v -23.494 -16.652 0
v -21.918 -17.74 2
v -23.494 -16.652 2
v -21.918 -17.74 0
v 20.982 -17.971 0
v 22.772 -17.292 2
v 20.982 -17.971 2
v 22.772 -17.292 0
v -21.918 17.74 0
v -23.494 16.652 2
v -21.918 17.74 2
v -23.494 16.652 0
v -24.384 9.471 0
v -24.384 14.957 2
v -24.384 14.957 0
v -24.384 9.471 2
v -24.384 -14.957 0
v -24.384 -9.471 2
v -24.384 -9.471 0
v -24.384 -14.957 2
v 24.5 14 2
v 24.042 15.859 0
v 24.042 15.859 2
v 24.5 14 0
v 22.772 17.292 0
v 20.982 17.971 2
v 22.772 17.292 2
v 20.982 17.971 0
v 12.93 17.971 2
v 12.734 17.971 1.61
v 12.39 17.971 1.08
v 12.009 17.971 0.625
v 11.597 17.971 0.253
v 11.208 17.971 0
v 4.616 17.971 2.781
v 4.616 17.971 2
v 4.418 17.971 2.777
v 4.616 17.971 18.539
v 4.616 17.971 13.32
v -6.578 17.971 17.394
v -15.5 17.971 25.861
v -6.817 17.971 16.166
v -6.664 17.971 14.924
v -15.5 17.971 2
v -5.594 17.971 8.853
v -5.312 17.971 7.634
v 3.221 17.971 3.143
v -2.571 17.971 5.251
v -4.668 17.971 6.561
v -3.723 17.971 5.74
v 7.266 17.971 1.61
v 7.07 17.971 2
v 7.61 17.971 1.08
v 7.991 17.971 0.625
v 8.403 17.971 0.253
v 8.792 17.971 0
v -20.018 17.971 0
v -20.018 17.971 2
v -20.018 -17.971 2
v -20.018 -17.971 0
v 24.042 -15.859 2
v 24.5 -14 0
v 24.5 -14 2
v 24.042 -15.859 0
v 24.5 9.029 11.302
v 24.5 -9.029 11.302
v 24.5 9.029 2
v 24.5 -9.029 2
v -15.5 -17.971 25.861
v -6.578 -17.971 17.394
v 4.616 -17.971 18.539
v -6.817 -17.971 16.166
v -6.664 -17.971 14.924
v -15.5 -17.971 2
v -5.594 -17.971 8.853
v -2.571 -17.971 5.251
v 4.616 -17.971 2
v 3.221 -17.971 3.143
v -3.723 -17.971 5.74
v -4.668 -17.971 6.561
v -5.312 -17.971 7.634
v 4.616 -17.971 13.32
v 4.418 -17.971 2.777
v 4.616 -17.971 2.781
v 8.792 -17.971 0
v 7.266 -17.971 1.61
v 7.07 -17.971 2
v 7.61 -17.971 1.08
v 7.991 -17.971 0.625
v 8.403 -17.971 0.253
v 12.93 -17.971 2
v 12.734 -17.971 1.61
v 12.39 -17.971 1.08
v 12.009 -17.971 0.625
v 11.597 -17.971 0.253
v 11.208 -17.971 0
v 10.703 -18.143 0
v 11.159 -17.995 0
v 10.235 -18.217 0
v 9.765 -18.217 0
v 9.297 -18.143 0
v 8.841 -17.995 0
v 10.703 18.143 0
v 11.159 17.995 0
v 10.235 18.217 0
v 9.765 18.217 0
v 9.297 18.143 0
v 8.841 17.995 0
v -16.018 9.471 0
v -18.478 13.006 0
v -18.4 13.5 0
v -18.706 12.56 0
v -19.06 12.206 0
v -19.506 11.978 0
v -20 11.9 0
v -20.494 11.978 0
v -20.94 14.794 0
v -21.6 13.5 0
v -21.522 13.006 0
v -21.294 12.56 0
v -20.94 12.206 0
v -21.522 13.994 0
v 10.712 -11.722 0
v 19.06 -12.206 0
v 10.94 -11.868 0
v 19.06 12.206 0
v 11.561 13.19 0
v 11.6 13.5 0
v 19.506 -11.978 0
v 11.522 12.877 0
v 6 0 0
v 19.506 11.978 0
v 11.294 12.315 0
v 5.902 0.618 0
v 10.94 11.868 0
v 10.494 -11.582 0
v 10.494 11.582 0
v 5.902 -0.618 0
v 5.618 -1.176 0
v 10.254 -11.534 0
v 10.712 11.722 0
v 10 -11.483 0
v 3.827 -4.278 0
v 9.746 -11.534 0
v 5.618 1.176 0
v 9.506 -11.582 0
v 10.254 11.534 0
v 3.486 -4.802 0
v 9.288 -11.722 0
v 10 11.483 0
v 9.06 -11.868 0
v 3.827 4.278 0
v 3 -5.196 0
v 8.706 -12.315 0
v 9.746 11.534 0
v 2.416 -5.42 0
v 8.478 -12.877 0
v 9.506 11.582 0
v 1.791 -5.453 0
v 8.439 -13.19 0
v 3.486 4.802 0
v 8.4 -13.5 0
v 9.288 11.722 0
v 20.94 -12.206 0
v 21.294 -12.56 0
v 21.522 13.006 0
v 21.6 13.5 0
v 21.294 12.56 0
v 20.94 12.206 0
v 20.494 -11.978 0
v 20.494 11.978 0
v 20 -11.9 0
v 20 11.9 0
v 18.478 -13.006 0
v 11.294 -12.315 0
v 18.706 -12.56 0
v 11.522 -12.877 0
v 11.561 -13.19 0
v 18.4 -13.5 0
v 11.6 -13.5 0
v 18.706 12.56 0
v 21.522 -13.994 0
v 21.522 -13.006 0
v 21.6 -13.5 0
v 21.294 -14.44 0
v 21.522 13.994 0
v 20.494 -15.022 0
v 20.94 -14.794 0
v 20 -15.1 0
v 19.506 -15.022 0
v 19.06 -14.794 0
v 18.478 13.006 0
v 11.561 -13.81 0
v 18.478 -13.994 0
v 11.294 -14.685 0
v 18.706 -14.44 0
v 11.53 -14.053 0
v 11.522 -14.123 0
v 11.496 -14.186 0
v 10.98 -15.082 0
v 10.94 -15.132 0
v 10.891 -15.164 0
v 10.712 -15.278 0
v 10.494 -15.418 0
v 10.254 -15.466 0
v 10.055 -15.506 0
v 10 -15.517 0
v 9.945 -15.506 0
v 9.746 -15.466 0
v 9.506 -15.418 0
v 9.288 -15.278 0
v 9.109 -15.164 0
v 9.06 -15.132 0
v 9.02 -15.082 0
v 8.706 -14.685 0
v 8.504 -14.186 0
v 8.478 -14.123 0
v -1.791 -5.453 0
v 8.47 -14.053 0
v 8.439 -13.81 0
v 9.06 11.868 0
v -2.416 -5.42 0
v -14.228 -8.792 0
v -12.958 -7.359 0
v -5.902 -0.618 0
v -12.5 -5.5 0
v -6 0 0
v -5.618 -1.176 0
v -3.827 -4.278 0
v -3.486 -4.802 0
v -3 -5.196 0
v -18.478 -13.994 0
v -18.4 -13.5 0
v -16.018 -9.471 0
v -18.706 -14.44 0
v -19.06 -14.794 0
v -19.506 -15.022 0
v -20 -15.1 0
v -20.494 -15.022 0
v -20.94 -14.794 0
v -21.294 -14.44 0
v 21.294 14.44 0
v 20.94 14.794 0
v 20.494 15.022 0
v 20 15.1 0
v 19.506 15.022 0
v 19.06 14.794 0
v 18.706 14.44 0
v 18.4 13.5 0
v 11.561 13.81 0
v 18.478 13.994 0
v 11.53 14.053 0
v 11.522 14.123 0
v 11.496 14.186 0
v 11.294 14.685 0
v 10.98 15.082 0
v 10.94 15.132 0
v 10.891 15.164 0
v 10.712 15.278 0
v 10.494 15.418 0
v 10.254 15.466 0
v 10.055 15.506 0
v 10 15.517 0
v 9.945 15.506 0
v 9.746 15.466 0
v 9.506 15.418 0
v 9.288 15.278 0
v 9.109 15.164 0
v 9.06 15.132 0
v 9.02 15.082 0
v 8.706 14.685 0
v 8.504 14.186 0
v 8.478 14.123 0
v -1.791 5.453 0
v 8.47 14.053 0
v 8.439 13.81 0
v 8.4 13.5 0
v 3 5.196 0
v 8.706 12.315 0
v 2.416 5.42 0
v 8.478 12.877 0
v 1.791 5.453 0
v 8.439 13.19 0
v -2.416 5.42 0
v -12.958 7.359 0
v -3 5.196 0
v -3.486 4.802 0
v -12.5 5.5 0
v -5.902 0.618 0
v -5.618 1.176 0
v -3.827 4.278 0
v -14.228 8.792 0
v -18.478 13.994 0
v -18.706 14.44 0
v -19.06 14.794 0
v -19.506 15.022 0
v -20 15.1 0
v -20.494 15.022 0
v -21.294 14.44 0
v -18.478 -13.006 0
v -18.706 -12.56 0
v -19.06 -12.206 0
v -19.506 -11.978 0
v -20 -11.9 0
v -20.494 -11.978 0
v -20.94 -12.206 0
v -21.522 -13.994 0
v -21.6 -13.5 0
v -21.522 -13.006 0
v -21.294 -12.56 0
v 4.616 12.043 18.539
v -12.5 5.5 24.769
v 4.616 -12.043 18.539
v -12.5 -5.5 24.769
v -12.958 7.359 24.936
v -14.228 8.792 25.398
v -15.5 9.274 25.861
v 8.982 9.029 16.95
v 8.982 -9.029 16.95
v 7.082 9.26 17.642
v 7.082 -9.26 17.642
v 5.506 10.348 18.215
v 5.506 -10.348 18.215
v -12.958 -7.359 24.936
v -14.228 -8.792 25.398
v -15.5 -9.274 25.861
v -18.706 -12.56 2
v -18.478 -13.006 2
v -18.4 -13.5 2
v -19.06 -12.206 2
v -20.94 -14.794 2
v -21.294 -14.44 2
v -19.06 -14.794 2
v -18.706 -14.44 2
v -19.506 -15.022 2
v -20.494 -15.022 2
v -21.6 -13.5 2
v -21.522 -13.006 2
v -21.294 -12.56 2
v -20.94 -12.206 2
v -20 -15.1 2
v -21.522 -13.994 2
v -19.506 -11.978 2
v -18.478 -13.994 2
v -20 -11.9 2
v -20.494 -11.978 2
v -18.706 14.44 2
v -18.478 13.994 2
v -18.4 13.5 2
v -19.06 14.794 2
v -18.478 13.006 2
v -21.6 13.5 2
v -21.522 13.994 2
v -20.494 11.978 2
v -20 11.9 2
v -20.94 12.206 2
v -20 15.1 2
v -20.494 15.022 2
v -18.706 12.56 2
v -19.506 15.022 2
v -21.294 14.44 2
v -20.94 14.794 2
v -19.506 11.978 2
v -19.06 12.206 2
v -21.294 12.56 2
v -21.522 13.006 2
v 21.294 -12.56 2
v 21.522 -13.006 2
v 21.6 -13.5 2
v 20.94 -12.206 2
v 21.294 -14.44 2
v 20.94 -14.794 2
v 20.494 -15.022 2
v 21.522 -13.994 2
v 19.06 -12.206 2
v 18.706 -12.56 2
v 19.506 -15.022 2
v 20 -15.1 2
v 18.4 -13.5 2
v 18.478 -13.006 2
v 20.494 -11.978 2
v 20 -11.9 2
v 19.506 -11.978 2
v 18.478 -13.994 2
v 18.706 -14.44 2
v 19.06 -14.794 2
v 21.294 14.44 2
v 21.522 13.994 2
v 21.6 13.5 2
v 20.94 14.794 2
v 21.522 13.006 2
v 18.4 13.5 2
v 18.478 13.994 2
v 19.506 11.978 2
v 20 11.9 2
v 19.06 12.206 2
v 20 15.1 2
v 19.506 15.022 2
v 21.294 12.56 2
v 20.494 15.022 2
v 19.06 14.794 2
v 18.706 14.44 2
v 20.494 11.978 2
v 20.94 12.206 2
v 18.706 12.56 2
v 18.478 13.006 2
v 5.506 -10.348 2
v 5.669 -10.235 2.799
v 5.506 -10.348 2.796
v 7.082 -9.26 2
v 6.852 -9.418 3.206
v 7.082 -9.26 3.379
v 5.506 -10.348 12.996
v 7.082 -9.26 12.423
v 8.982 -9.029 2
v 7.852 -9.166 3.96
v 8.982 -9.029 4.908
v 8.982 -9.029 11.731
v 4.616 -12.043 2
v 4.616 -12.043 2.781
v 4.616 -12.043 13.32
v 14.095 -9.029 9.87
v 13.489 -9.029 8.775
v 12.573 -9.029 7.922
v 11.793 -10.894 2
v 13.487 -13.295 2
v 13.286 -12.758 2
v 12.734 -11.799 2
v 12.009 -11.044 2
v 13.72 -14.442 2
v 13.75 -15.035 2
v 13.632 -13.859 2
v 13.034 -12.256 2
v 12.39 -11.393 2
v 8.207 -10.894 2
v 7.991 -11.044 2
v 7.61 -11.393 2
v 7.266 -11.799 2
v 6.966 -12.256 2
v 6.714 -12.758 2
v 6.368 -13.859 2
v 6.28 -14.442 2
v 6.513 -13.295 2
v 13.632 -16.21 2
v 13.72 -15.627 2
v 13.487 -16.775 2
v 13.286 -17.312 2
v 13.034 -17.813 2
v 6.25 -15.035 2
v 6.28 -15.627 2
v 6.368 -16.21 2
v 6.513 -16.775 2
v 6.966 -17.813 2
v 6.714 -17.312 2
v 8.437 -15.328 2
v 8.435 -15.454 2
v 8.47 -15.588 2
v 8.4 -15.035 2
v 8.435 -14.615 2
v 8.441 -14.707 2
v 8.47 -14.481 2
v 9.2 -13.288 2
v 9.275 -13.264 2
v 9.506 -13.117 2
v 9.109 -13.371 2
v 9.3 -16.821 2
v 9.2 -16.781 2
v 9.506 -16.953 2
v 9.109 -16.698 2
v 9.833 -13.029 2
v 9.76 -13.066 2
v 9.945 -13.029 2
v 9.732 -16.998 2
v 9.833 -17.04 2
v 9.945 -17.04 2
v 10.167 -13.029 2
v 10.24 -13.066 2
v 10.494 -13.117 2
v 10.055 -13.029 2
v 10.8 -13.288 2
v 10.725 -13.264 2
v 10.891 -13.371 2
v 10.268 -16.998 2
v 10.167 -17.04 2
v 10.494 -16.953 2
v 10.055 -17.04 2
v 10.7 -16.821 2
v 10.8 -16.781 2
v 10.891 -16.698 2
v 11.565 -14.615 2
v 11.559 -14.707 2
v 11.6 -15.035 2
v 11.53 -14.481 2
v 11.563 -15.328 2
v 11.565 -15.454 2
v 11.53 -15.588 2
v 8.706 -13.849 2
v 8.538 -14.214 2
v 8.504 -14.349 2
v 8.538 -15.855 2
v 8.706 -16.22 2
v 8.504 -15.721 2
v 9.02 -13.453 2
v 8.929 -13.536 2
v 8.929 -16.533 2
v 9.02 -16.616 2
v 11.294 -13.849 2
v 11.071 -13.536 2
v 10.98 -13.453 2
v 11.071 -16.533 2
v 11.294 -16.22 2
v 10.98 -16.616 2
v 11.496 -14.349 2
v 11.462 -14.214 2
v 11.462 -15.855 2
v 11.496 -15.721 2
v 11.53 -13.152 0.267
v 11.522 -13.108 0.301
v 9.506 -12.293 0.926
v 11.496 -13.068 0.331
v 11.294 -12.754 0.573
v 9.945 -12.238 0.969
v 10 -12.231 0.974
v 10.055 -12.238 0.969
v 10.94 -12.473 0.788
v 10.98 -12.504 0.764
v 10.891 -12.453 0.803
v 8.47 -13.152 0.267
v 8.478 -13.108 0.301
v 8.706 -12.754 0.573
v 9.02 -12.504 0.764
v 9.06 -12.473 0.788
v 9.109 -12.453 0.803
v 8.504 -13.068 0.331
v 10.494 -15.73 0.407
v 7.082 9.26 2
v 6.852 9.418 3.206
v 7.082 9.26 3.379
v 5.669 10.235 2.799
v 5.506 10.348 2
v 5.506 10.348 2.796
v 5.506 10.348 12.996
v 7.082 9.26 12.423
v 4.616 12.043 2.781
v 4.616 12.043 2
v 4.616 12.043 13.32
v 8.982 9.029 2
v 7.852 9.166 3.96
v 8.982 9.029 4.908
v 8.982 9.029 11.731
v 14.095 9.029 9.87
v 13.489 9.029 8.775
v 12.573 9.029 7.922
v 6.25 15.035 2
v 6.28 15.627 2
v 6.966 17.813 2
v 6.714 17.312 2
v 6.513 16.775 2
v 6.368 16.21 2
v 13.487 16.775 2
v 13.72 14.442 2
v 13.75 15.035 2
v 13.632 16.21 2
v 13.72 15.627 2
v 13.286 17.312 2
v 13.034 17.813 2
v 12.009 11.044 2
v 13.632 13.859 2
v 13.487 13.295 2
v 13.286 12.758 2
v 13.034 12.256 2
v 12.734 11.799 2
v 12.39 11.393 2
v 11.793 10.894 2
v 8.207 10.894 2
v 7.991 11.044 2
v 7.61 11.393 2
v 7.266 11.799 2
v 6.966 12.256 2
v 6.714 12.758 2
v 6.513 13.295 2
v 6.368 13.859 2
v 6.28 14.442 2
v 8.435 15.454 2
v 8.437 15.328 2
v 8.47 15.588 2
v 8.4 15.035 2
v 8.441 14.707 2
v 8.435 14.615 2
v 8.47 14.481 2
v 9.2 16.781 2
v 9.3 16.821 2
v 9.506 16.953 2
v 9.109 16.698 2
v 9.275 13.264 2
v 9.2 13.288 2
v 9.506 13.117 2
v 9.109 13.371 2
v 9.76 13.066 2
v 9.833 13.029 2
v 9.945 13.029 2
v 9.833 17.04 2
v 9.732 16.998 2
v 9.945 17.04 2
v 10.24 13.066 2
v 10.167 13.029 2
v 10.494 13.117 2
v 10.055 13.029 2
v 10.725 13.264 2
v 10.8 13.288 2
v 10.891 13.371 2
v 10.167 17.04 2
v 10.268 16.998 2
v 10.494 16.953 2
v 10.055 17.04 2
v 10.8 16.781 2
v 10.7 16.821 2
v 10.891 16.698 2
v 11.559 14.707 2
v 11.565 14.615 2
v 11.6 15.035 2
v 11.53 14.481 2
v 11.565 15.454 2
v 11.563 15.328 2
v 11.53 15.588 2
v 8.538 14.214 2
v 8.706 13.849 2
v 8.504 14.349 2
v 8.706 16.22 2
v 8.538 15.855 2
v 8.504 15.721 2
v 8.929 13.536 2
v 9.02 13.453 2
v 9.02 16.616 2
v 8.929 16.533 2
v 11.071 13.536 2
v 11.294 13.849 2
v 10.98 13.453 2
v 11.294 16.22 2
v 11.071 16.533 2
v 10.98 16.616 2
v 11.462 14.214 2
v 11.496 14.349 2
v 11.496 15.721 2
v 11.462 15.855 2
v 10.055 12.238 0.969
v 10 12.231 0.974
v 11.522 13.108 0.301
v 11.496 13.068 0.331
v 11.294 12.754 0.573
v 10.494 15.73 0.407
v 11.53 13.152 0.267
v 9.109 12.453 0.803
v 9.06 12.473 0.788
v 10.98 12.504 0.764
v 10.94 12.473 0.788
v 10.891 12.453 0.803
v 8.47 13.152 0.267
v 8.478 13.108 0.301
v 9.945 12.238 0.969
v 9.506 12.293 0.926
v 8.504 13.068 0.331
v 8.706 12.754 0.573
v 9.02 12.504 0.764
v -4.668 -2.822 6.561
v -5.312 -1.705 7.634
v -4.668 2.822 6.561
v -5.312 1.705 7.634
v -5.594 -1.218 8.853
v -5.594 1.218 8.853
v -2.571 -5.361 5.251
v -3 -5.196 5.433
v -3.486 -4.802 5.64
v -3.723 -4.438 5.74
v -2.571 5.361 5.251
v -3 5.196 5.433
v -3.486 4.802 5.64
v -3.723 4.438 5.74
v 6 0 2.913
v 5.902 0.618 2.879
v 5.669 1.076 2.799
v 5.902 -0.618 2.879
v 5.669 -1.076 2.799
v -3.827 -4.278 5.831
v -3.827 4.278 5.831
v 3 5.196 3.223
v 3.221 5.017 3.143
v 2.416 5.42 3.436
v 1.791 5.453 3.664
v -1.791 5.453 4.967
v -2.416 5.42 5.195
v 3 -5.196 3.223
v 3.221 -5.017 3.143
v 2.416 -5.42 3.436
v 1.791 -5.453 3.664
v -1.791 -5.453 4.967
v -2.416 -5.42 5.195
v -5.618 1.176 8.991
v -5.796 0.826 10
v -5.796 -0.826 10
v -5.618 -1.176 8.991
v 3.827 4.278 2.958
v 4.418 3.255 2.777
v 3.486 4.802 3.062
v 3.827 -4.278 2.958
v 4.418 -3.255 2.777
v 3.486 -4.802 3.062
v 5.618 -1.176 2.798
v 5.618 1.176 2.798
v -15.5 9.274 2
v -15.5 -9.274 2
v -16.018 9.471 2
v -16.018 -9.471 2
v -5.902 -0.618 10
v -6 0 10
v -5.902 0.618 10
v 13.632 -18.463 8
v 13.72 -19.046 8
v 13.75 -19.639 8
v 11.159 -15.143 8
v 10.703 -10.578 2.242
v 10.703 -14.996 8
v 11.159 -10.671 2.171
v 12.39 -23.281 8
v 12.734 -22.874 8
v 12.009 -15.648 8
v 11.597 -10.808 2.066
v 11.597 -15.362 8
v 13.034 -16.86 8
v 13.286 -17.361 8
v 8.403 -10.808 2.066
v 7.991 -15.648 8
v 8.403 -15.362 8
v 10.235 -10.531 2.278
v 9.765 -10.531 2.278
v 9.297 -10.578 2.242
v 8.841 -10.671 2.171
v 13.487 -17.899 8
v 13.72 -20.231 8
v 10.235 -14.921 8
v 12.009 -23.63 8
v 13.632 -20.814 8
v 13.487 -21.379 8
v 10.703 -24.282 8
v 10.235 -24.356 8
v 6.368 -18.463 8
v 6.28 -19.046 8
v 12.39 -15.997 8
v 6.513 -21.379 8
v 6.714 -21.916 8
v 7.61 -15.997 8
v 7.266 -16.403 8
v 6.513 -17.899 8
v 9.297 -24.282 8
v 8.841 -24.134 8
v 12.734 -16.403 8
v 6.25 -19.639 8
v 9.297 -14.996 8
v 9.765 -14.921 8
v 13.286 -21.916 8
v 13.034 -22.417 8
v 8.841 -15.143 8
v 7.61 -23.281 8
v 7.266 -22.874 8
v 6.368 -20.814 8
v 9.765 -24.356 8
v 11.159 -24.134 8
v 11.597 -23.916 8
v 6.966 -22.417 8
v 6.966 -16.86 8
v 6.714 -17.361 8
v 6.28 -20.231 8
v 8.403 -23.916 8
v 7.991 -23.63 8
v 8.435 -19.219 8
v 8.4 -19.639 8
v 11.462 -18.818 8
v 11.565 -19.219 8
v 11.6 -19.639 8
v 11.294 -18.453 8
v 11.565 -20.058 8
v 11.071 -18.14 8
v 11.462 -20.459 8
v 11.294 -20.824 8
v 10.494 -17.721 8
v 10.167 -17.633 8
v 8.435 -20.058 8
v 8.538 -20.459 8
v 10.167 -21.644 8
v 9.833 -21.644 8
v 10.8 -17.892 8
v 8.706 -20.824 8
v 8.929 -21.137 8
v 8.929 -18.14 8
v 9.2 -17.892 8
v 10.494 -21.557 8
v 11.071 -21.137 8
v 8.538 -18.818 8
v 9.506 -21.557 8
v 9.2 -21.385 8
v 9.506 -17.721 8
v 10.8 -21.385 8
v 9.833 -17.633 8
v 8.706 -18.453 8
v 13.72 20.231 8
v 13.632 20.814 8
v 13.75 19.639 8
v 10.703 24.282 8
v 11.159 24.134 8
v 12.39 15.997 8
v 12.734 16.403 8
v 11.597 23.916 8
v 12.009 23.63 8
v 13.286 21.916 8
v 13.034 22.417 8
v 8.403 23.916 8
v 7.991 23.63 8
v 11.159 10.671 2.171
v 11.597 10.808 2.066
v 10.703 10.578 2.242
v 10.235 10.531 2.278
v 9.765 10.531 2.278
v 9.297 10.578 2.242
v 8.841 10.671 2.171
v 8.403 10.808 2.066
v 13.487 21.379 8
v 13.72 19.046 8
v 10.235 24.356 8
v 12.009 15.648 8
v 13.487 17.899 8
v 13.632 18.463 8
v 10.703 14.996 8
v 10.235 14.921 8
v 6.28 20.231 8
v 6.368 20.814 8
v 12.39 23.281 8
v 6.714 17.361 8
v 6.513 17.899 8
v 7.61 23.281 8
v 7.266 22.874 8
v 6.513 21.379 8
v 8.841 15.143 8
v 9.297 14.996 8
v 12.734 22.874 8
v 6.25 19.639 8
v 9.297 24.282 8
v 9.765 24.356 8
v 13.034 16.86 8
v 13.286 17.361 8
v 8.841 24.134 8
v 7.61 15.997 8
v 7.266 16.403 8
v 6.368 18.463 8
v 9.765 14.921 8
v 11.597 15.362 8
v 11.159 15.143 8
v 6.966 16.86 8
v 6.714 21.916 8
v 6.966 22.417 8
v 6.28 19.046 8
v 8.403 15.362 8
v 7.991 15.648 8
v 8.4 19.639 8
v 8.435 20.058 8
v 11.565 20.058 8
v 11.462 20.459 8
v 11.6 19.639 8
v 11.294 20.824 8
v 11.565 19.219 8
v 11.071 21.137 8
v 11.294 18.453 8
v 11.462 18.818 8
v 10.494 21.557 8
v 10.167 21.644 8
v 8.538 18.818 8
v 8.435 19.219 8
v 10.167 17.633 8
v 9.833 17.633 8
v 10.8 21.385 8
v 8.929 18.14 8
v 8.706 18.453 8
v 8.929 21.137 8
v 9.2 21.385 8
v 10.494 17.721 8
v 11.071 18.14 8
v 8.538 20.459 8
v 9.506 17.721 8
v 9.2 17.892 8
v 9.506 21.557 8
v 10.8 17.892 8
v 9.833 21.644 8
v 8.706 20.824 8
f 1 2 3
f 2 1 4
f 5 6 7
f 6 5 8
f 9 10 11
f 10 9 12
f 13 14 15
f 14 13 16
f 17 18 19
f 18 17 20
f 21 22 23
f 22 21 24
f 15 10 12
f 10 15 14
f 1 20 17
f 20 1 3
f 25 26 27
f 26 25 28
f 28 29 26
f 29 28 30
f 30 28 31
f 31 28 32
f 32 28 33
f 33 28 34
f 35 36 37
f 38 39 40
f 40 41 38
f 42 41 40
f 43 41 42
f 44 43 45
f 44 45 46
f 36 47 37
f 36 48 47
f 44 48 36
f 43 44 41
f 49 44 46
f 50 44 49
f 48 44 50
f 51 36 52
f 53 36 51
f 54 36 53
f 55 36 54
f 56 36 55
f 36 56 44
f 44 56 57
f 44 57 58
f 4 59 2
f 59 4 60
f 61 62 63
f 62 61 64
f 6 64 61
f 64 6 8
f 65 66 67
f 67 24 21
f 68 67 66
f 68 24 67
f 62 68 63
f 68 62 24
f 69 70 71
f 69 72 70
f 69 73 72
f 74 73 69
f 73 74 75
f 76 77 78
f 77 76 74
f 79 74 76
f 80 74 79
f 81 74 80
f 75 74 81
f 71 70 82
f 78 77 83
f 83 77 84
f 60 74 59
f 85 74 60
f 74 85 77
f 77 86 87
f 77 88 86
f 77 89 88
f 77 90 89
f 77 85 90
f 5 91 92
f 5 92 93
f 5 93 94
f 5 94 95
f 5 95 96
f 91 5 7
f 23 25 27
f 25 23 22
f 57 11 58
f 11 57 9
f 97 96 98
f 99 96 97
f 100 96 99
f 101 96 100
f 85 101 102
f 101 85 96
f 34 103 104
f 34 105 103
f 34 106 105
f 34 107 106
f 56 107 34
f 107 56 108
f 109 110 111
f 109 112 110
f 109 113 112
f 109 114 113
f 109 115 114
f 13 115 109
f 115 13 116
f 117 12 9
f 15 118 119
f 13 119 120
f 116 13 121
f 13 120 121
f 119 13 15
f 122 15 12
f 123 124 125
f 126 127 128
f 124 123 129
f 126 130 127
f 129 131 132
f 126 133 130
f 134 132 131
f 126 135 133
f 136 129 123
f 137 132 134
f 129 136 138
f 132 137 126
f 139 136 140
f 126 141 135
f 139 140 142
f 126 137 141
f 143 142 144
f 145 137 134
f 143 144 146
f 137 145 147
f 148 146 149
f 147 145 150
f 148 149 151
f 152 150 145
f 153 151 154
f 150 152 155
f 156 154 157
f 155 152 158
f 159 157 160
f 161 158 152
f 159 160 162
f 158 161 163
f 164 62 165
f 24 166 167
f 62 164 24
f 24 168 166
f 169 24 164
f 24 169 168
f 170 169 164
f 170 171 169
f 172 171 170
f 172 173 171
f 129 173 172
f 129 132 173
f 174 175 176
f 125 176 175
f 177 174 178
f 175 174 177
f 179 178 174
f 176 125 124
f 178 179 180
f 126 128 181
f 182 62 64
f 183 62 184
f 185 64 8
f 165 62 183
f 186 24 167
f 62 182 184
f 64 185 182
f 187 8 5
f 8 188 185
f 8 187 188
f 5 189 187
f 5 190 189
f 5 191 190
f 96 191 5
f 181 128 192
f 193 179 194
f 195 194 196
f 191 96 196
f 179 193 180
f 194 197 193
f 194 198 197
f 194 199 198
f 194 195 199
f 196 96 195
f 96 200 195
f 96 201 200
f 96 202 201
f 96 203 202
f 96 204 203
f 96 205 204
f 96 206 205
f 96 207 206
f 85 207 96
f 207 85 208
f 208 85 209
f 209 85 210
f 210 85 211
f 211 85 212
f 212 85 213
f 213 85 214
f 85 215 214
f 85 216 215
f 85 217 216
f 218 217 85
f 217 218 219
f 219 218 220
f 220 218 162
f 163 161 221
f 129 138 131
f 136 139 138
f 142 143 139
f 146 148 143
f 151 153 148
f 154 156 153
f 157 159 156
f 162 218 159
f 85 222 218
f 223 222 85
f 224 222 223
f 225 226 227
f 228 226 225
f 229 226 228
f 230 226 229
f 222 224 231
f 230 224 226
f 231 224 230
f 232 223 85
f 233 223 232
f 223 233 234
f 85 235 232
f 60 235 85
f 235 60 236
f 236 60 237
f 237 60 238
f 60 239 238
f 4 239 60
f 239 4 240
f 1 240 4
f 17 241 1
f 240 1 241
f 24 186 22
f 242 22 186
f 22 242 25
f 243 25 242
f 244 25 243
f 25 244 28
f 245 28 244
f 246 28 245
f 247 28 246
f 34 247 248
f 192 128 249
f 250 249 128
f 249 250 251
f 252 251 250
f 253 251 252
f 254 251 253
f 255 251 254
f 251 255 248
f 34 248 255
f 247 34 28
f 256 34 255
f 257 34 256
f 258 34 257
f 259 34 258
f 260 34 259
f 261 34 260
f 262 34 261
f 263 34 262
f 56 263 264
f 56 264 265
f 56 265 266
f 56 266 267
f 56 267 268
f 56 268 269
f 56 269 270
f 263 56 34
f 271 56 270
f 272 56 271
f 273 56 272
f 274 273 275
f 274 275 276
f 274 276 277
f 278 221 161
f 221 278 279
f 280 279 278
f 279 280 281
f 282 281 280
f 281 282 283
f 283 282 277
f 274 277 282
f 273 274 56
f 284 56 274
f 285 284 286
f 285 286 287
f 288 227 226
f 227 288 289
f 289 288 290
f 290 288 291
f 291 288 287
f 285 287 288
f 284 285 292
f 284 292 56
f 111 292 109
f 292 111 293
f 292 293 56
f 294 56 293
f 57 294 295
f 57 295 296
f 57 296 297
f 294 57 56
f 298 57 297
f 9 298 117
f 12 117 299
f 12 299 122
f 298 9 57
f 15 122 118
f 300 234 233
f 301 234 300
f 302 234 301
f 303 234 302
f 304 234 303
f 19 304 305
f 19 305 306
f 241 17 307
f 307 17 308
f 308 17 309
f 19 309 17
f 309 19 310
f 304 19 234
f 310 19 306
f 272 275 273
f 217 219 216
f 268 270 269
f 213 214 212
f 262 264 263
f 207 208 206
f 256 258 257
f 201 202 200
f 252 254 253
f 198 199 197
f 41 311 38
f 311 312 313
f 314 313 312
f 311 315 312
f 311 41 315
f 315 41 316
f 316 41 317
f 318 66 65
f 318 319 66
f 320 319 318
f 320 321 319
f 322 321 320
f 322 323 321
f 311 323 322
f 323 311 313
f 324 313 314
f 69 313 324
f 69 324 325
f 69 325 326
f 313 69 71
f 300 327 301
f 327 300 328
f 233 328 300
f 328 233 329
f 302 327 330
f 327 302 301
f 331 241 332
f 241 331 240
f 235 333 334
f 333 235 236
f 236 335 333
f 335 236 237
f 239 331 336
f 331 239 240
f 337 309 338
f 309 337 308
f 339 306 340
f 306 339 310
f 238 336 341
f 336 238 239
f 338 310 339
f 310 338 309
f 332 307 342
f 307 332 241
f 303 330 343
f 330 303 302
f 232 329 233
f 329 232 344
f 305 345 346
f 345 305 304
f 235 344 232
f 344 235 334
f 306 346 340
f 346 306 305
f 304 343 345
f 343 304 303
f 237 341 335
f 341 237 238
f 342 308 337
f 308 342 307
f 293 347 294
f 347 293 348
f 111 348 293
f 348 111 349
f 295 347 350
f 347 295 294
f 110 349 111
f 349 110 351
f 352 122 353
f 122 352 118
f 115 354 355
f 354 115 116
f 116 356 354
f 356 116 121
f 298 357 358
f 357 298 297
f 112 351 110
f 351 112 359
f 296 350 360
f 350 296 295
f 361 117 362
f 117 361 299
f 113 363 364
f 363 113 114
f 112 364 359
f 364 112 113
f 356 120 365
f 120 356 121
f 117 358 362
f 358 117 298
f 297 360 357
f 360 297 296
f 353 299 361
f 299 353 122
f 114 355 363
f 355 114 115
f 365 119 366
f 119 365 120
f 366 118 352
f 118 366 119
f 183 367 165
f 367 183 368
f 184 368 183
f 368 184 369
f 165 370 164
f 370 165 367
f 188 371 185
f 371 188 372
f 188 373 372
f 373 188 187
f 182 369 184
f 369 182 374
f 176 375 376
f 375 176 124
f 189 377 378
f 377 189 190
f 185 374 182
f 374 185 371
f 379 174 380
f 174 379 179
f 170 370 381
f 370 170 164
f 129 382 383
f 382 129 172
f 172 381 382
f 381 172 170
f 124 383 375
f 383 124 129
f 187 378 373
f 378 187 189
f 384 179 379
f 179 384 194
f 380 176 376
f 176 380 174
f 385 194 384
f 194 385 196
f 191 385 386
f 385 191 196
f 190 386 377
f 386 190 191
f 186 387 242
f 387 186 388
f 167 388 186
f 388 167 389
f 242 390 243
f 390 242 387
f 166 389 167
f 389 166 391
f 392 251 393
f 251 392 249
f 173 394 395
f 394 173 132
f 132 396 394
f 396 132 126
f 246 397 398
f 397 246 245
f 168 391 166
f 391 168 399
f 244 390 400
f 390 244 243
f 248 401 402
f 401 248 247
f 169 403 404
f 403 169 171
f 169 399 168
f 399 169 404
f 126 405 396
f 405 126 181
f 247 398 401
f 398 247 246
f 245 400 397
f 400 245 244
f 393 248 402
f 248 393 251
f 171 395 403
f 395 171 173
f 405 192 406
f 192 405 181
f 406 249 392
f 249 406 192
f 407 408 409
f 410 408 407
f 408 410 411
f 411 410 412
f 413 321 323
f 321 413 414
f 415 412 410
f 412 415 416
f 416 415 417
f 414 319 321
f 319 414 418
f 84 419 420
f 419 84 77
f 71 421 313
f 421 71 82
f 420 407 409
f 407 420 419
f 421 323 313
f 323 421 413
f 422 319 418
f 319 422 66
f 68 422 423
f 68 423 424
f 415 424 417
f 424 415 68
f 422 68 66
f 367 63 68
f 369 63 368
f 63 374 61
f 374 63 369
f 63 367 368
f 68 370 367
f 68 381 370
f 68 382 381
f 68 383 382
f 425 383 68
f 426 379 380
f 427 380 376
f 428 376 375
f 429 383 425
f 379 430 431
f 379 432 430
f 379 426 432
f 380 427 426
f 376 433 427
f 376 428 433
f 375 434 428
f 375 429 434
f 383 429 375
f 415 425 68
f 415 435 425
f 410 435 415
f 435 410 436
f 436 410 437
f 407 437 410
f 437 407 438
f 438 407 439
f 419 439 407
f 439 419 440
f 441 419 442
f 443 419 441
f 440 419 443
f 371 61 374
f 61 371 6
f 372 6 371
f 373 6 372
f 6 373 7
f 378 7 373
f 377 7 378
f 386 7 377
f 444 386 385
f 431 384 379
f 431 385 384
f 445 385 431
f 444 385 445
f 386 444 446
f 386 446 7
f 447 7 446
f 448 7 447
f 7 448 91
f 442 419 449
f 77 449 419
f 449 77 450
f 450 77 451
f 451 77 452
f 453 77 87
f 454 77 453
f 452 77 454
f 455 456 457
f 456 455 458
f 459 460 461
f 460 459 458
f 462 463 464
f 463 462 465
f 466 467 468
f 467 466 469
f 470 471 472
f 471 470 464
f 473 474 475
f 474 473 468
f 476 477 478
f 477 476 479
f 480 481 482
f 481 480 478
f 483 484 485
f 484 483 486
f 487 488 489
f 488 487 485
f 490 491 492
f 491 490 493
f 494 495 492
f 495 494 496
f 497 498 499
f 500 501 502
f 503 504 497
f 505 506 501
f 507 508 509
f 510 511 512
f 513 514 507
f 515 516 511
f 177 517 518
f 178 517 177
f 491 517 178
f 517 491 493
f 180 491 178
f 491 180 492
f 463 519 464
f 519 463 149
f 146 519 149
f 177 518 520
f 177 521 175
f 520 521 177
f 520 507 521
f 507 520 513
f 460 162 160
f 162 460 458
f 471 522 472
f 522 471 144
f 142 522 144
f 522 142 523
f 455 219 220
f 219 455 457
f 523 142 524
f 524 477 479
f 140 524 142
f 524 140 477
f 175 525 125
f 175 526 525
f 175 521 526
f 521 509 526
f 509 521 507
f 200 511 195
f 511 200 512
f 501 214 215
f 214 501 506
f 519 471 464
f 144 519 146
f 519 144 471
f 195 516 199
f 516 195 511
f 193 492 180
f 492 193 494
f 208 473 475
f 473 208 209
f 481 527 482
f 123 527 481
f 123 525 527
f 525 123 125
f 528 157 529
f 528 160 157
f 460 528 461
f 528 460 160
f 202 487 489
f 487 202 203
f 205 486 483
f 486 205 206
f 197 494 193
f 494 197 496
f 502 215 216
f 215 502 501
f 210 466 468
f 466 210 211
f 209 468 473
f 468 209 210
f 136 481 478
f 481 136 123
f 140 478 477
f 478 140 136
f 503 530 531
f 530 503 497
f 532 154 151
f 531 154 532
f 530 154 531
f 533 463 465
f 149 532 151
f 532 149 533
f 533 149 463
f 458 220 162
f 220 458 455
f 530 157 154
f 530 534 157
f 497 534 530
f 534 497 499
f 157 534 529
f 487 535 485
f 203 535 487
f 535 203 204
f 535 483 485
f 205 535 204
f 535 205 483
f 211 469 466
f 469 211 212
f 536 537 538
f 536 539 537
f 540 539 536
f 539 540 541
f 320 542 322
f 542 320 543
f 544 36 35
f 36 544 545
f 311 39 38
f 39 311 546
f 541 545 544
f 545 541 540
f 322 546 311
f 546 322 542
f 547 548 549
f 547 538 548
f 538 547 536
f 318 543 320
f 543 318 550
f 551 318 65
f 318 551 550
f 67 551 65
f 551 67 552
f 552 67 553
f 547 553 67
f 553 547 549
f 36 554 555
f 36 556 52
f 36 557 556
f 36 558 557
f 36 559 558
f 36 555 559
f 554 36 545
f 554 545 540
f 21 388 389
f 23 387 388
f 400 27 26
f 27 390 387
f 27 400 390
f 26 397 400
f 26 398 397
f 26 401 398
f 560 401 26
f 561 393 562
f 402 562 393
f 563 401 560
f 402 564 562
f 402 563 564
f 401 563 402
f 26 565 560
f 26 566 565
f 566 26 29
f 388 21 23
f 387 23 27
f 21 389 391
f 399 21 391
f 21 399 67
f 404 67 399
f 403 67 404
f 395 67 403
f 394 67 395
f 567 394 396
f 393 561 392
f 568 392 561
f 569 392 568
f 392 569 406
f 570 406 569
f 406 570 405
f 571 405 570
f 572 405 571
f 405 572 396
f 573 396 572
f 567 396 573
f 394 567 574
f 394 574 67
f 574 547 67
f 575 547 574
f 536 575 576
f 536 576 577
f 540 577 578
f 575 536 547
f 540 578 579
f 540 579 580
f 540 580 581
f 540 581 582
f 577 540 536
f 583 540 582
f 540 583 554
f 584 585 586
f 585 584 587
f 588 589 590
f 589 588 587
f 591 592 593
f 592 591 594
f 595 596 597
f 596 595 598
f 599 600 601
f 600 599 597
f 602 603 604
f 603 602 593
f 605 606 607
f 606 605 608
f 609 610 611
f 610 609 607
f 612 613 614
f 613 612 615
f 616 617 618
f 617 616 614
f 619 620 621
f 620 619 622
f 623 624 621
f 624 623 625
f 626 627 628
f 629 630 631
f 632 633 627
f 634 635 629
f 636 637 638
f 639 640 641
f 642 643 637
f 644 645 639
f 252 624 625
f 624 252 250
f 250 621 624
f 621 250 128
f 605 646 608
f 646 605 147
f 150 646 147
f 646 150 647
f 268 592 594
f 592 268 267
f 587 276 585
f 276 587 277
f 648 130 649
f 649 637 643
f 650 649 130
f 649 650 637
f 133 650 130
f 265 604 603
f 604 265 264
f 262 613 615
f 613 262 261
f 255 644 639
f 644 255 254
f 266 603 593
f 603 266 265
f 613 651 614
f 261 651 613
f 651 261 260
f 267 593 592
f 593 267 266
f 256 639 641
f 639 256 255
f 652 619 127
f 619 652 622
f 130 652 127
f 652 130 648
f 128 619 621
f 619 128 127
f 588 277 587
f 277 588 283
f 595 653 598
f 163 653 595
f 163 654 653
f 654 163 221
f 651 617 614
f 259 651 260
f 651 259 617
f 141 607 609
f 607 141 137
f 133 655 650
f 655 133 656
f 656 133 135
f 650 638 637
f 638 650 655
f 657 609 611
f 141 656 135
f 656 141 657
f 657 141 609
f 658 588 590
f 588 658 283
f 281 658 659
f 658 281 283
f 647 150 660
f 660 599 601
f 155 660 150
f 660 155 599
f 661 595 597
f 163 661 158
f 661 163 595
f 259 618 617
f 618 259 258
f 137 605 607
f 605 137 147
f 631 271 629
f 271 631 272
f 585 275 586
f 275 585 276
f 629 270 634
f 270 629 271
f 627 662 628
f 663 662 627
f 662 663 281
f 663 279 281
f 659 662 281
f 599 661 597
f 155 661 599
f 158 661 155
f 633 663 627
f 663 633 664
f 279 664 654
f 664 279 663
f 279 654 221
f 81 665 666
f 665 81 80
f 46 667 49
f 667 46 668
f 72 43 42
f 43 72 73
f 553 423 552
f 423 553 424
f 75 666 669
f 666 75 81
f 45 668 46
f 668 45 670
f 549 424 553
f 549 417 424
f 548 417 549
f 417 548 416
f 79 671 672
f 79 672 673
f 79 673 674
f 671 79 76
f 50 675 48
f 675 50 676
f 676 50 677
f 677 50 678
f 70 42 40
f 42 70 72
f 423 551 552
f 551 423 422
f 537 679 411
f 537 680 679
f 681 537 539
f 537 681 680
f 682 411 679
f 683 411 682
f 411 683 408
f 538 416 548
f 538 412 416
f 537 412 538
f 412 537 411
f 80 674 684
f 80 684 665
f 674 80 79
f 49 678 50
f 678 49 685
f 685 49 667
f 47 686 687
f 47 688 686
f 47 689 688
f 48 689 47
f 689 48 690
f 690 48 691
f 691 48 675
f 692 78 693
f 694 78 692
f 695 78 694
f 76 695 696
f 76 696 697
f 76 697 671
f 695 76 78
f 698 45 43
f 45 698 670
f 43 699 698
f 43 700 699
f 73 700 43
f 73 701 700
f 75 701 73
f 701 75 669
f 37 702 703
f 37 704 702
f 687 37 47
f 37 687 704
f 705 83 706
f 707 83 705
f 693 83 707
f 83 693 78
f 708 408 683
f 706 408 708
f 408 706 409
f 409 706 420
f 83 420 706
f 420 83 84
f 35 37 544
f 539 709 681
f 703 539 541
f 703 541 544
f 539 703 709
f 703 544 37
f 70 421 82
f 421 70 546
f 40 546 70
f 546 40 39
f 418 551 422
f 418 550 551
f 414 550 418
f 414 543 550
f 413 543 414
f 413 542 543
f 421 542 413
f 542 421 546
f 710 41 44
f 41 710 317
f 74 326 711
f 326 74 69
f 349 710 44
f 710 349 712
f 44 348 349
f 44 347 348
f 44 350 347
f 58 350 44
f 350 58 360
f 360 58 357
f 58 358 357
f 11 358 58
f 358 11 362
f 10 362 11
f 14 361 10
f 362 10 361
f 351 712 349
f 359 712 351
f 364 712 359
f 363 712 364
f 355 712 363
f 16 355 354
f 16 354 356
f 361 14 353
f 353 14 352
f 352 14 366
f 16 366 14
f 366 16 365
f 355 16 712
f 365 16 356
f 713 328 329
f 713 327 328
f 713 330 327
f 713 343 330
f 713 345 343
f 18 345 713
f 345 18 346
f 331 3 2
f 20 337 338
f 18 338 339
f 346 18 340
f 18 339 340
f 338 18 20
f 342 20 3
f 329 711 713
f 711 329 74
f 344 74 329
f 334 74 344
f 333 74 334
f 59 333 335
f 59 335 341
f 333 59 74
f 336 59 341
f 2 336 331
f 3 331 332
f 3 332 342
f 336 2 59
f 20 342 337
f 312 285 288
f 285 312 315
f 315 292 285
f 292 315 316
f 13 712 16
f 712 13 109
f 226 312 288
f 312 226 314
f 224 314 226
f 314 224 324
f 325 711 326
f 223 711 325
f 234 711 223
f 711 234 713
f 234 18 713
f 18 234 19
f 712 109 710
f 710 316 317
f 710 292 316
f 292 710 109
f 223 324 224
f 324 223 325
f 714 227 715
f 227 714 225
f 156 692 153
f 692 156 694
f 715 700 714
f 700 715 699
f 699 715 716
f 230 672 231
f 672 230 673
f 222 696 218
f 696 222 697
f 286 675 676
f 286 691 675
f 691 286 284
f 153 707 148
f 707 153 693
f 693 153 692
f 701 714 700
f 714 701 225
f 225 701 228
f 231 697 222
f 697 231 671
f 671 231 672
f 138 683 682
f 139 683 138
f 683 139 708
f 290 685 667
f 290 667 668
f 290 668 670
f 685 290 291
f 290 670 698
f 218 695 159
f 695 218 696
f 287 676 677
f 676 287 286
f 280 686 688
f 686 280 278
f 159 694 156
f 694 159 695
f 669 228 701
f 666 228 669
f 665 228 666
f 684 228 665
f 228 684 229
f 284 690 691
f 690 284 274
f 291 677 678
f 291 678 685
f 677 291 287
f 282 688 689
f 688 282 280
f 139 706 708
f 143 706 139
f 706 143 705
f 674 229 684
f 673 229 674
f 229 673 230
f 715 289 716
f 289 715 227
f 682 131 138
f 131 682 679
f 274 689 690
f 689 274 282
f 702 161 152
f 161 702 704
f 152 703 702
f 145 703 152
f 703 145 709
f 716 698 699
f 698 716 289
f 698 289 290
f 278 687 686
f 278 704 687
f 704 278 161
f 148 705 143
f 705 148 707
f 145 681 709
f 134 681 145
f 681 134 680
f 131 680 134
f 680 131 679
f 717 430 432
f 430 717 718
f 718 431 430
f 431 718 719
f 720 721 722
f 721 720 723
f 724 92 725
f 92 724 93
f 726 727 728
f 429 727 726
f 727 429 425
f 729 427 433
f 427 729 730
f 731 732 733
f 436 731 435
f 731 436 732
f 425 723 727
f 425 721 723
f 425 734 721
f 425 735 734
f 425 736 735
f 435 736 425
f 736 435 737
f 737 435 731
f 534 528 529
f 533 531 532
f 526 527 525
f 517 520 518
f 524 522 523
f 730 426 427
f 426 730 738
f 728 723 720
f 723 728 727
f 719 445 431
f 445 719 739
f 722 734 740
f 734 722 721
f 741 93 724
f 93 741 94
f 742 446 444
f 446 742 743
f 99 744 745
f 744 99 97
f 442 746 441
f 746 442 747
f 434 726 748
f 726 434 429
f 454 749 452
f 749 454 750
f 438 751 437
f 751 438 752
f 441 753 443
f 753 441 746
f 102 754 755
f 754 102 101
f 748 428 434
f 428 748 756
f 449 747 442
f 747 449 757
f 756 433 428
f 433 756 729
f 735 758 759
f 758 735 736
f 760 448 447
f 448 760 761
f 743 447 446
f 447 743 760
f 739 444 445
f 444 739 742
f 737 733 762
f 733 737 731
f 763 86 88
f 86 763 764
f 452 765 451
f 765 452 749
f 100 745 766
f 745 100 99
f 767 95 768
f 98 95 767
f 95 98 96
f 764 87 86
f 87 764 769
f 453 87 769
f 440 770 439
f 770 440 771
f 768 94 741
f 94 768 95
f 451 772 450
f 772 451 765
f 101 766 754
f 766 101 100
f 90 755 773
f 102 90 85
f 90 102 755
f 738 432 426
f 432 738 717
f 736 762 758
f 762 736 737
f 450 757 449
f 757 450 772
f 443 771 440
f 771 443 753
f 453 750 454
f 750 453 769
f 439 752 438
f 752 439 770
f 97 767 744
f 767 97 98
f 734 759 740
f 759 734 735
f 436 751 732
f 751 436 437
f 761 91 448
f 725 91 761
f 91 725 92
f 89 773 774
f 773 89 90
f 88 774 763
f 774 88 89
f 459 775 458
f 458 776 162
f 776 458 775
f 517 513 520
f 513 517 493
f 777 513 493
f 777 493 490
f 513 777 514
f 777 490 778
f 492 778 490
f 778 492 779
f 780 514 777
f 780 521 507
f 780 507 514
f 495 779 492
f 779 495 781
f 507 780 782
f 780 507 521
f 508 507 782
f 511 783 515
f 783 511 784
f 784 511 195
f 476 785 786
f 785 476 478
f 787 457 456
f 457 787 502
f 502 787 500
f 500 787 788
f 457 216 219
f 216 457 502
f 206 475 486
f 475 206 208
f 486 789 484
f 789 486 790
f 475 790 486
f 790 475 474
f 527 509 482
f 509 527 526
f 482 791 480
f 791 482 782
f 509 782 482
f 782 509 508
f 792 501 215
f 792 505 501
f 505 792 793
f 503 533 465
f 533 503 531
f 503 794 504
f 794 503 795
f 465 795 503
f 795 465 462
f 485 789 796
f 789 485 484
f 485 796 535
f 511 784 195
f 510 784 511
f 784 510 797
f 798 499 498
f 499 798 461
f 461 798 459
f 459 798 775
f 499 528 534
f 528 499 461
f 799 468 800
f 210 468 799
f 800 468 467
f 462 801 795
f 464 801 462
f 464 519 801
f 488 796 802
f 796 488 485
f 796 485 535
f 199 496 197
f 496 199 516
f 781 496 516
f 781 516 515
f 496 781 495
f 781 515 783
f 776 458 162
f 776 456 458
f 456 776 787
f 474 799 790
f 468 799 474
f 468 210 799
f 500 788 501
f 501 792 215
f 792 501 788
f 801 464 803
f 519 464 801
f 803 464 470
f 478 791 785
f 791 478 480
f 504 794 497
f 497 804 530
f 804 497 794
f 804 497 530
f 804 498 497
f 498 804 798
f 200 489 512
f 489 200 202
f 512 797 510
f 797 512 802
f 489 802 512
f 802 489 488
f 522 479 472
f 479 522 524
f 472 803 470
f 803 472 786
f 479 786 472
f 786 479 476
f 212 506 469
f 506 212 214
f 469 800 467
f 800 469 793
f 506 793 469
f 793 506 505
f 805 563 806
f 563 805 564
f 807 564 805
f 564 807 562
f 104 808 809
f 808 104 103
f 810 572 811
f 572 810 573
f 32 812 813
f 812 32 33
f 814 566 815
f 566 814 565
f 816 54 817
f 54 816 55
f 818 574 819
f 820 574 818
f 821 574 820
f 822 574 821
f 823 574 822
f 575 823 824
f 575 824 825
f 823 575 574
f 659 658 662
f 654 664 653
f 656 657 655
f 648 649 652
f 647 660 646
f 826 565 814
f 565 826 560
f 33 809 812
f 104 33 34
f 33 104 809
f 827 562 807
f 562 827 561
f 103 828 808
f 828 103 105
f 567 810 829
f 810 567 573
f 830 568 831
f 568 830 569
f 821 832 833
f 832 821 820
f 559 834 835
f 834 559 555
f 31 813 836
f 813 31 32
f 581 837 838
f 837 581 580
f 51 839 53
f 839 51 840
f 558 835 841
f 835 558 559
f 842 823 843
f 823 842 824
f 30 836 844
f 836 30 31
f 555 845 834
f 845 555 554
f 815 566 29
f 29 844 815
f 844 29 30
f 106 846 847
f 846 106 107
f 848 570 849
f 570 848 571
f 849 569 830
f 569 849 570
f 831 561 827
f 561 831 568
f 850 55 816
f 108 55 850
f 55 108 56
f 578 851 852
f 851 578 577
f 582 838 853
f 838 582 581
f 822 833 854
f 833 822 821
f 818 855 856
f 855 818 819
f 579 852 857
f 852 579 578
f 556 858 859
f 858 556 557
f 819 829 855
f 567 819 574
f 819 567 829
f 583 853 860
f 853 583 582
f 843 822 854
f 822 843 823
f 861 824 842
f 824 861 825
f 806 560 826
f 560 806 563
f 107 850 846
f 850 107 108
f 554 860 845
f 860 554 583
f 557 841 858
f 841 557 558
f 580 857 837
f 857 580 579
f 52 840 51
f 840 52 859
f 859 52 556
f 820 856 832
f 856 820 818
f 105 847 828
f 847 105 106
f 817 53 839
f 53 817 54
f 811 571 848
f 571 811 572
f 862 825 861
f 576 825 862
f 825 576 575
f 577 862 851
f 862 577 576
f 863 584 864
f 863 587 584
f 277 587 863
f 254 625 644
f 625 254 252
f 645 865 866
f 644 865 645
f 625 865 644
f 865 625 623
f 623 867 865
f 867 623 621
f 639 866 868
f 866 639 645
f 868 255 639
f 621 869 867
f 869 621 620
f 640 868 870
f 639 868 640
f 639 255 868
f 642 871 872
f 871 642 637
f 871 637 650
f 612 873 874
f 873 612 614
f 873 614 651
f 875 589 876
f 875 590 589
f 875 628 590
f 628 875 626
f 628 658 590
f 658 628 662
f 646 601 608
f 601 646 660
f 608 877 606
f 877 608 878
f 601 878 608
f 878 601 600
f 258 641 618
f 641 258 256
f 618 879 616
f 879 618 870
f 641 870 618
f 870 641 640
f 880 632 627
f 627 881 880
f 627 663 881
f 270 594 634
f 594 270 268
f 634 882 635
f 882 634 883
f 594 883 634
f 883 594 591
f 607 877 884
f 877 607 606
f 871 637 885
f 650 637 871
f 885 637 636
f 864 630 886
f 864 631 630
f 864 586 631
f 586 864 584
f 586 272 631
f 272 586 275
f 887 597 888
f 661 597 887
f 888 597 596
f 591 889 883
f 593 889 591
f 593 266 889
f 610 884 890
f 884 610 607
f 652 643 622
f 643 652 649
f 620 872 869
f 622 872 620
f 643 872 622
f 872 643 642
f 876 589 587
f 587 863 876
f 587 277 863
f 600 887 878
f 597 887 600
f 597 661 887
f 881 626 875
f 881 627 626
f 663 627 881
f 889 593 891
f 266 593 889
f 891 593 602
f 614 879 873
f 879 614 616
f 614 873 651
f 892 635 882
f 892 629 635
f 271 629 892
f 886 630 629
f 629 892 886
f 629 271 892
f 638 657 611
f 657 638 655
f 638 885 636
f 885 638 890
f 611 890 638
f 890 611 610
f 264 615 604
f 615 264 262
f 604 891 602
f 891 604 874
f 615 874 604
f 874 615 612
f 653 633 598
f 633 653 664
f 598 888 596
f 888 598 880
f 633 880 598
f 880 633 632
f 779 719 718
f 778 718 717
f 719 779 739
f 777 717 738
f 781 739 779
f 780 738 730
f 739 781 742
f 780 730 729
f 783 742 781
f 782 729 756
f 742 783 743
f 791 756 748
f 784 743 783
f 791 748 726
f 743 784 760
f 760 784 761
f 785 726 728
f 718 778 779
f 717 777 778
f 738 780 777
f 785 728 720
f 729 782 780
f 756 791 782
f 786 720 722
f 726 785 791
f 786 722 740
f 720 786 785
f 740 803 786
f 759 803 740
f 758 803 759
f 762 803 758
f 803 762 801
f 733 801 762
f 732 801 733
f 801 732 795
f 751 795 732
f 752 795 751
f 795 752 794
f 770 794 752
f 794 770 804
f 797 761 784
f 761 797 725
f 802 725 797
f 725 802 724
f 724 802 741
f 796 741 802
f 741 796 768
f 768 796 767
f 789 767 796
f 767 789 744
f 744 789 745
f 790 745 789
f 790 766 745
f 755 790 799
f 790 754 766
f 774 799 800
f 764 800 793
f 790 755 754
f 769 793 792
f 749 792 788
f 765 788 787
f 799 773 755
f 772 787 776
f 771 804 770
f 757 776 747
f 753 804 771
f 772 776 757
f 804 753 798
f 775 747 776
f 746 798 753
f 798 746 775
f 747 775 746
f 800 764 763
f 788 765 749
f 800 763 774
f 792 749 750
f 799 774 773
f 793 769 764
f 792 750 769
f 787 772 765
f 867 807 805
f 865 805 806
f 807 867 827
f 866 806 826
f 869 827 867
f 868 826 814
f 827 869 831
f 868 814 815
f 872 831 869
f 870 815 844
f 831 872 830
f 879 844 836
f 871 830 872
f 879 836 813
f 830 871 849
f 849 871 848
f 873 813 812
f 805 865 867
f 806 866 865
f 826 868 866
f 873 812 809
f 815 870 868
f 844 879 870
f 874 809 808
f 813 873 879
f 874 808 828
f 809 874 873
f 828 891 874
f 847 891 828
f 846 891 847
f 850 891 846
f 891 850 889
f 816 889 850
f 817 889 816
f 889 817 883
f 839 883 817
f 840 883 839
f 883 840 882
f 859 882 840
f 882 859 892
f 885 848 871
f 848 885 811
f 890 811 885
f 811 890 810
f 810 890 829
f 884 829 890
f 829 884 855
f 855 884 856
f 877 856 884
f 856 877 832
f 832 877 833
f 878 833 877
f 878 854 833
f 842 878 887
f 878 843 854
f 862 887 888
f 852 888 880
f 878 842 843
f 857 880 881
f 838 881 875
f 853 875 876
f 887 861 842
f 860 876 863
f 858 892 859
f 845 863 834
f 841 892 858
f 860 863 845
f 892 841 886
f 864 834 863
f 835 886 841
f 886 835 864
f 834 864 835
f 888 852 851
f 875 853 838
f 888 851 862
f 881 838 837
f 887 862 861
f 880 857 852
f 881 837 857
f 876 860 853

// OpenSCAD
// file: honeycomb_lattice.scad
/**
 * Honeycomb lattice library
 *
 * @autor: vpoten
 */
 
/**
 *
 */
module hexagon(rad, cornerR, thick) {
hull(){
	for(i=[0:5]){
	rotate([0,0,60*i]) translate([rad,0,0]) cylinder(r=cornerR, h=thick, $fn=20);
	}
}
}//end module hexagon

/**
 * @param rows:  number of rowns, must be greater than 0
 * @param cols:  number of colummns, must be greater than 1
 */
module honeycombLattice(rows, cols, hexaR, cornerR, thick, innerDst, fillHalves=false) {

extHexR = sqrt(2*cornerR*cornerR) + hexaR + innerDst/2;
extHexSideL = sin(30)*extHexR*2;
extHexH = cos(30)*extHexR;
dist = 2*extHexR + extHexSideL;
hexH = sqrt(2*cornerR*cornerR) + hexaR;

numEvenCols = floor(cols/2)+(cols%2);
numOddCols = floor(cols/2);

translate([extHexR,extHexH,0]) {
for(i=[0:rows-1]){
	if((i%2)==1){
		for(j=[0:numOddCols-1]) translate([dist*j+(extHexR+extHexSideL/2),i*extHexH,0]) hexagon(hexaR, cornerR, thick);
	}
	else{
		for(j=[0:numEvenCols-1]) translate([dist*j,i*extHexH,0]) hexagon(hexaR, cornerR, thick);
	}
}

if( fillHalves==true ){

	for(i=[-1,rows]){ 
		for(j=[0:numOddCols-1]) translate([dist*j+(extHexR+extHexSideL/2),i*extHexH,0]){
			difference(){
			hexagon(hexaR, cornerR, thick);
			if(i==-1){ translate([0,-extHexR/2+innerDst/2,0]) cube(size=[extHexR*2,extHexR,thick*2.5],center=true); }
			else{ translate([0,extHexR/2-innerDst/2,0]) cube(size=[extHexR*2,extHexR,thick*2.5],center=true); }
			}
		}
	}
}

}//translate

}//end module honeycombLattice

//test
hexagon(20, 2, 29);
honeycombLattice(2, 4, 15, 3, 3, 11, fillHalves=false);
color("grey") translate([0,0,40]) honeycombLattice(5, 6, 11, 2, 3, 19, fillHalves=true);
color("blue") translate([0,0,60]) honeycombLattice(3, 5, 5, 2, bottomThick+1, 3, fillHalves=true);
// file: dronePlates.scad
/**
 * dronePlates.scad
 * Plate library
 *
 * GNU GPL V3
 * @author: Victor Potenciano
 */

m3Rad = 3.4/2;
cornerR = 4;

/**
 *
 */
module helperDisk(diameter) {
	cylinder(r = diameter/2, h = 0.6, $fn=20);
}

/**
 *
 */
module roundedRect(size, radius) {
	x = size[0];
	y = size[1];
	z = size[2];

	linear_extrude(height=z)
	hull() {
	// place 4 circles in the corners, with the given radius
	translate([(-x/2)+(radius/2), (-y/2)+(radius/2), 0]){ circle(r=radius); }
	translate([(x/2)-(radius/2), (-y/2)+(radius/2), 0]){ circle(r=radius); }
	translate([(-x/2)+(radius/2), (y/2)-(radius/2), 0]){ circle(r=radius); }
	translate([(x/2)-(radius/2), (y/2)-(radius/2), 0]){ circle(r=radius); }
	}
}

/**
 * rounded rectangle triangle with corner at origin
 */
module roundedTriangle(size, radius) {
	x = size[0];
	y = size[1];
	z = size[2];

	linear_extrude(height=z)
	hull() {
	translate([radius, radius, 0]){ circle(r=radius); }
	translate([x-radius, radius, 0]){ circle(r=radius); }
	translate([radius, y-radius, 0]){ circle(r=radius); }
	}
}

/**
 *
 */
module roundRectPlate(w, l, plateThick=3) {
	difference(){
		roundedRect([l+m3Rad*1.75,w+m3Rad*1.75,plateThick], cornerR);
		translate([l/2, w/2, -0.5]) { cylinder(h = plateThick+1, r = m3Rad, $fn=30); }
		translate([-l/2, w/2, -0.5]) { cylinder(h = plateThick+1, r = m3Rad, $fn=30); }
		translate([l/2, -w/2, -0.5]) { cylinder(h = plateThick+1, r = m3Rad, $fn=30); }
		translate([-l/2, -w/2, -0.5]) { cylinder(h = plateThick+1, r = m3Rad, $fn=30); }
	}
}

/**
 *
 */
module crossSquarePlate(l, thick=3) {
	inDist = cornerR*2+4;
	trianL = sqrt((l*l)/2)-inDist;
	centerR = 4;

	difference(){
		roundRectPlate(l, l, thick);
		translate([0, centerR, -0.5]) { 
			rotate([0,0,45]){ roundedTriangle([trianL,trianL,thick+1], cornerR-2); }
		}
		translate([0, -centerR, -0.5]) { 
			rotate([0,0,225]){ roundedTriangle([trianL,trianL,thick+1], cornerR-2); }
		}
		translate([-centerR, 0, -0.5]) { 
			rotate([0,0,135]){ roundedTriangle([trianL,trianL,thick+1], cornerR-2); }
		}
		translate([centerR, 0, -0.5]) { 
			rotate([0,0,-45]){ roundedTriangle([trianL,trianL,thick+1], cornerR-2); }
		}
	}
}

/**
 *
 */
module hShapePlate(w, l, thick=4) {
	inDist = cornerR*2+1;

	difference(){
		roundRectPlate(w, l, thick);
		translate([0, w/4, -0.5]) { roundedRect([l-inDist,w/2-inDist,thick+1], cornerR-2); }
		translate([0, -w/4, -0.5]) { roundedRect([l-inDist,w/2-inDist,thick+1], cornerR-2); }
	}
}

/**
 *
 */
module motorCircleMount(inDia, outDia, thick=3, extraH=false, d1=19, d2=16, holeR=m3Rad ) {
	difference(){
		cylinder(h = thick, r = outDia/2, $fn=30);
		motorCircleMountHoles(inDia, outDia, thick, extraH, d1=d1, d2=d2, holeR=holeR);
	}
}

/**
 *
 */
module motorCircleMountHoles(inDia, outDia, thick=3, extraH=false, d1=19, d2=16, d3=25, holeR=m3Rad) {
	translate([0, 0, -0.5]) { cylinder(h = thick+1, r = inDia/2, $fn=30); }

	for(i=[0:3]) {
		rotate([0,0,90*i]){
		translate([d1/2, 0, -0.5]) cylinder(h = thick+1, r = holeR, $fn=20);
		translate([d2/2, 0, -0.5]) cylinder(h = thick+1, r = holeR, $fn=20);
		translate([d2/2, -holeR, -0.5]) cube(size = [(d1-d2)/2,holeR*2,thick+1]);
		}
	}
	
	if(extraH==true){	
		for(i=[-1,1]) translate([i*d3/2, 0, -0.5]) { cylinder(h = thick+1, r = holeR, $fn=30); }
	}
}

/**
 *
 */
module motorRectMount(w, l, inDia, thick=3) {
	d1=19;
	d2=16;

	difference(){
		roundRectPlate(w, l, thick);
		translate([0, 0, -0.5]) { cylinder(h = thick+1, r = inDia/2, $fn=30); }
		translate([0, d1/2, -0.5]) { cylinder(h = thick+1, r = m3Rad, $fn=30); }
		translate([0, -d1/2, -0.5]) { cylinder(h = thick+1, r = m3Rad, $fn=30); }
		translate([d2/2, 0, -0.5]) { cylinder(h = thick+1, r = m3Rad, $fn=30); }
		translate([-d2/2, 0, -0.5]) { cylinder(h = thick+1, r = m3Rad, $fn=30); }
	}
}

/**
 *
 */
module tube(inDia, outDia, height) {
	difference(){
		cylinder(h = height, r = outDia/2, $fn=50);
		translate([0, 0, -0.5]) { cylinder(h = height+1, r = inDia/2, $fn=30); }
	}
}

/**
 *
 */
module squareTube(inDia, outDia, height) {
	translate([0,0,height/2]){
	difference(){
		cube(size = [outDia,outDia,height], center = true);
		cube(size = [inDia,inDia,height+1], center = true);
	}
	}
}

/**
 *
 */
module djiFlamewheelHoles(height) {
	a = 23;
	b = 16;
	c = 19.5;
	
	translate([a/2, c/2, 0]) { cylinder(h = height, r = m3Rad, $fn=30); }
	translate([-a/2, c/2, 0]) { cylinder(h = height, r = m3Rad, $fn=30); }
	translate([b/2, -c/2, 0]) { cylinder(h = height, r = m3Rad, $fn=30); }
	translate([-b/2, -c/2, 0]) { cylinder(h = height, r = m3Rad, $fn=30); }
}

/**
 *
 */
module djiFlamewheelHolesBotton(height) {
	a1 = 21;
	c = 19.5;
	
	translate([a1/2, c/2, 0]) { cylinder(h = height, r = m3Rad, $fn=30); }
	translate([-a1/2, c/2, 0]) { cylinder(h = height, r = m3Rad, $fn=30); }
}

/**
 *
 */
module propeller(size){
union(){
difference(){
	cylinder(h = 3, r = size/2, center=true, $fn=30);
	cylinder(h = 3.1, r = size/2-2, center=true, $fn=30); 
}
for( i = [-1,1] ){
rotate([0,0,45*i]){ cube(size = [size,4,1], center = true); }
}
}
}

/**
 *
 */
module slot(length, height, rad){
for(i=[-1,1]) translate([i*length/2,0,0]) cylinder(h = height, r = rad, $fn=30);
translate([0,0,height/2]) cube(size = [length,rad*2,height], center = true);
}

 

////////////////////////
// Examples:
////////////////////////

motorCircleMount(8, 25, 3.5);

//roundedRect([50,50,3], 4);

//hShapePlate(79, 25);

//rotate([0,0,45]){roundedTriangle([40,40,3], 4);}

//crossSquarePlate(45, 4);

/*
union(){
motorRectMount(21, 18, 8, 4);
translate([9, 10.5, 0]) {tube(m3Rad*2, 6.5, 6);}
}
*/

/*
difference(){
union(){
hShapePlate(50, 30, 3.5);
translate([-4,-25,0]){cube(size = [8,50,3.5]);}
rotate([0, 0, 45]) {motorCircleMount(8, 35, 3.5);}
}
cylinder(h = 10, r = 4, $fn=100, center=true);
}
*/

//rotate([90,0,0]){ tube(5,10,20); }
//translate([20,0,0]){ squareTube(5, 10, 20); }
// main file
/** 
 * tweaker mobius simple mount
 */

use <dronePlates.scad>;
use <honeycomb_lattice.scad>;

m3Rad = 3.2/2;
angle=20;
length=45;
width=32;
thick=2;
angle2=75;



///translate([45,0,0]) cube(size=[5,5,12]); //probe

difference(){

intersection(){
roundedRect([length,32,30], 4);
rotate([0,angle,0]) translate([0,0,-25+19]) cube(size=[100,50,50], center=true);
}

//holes
for(i=[-1,1]) for(j=[-1,1]) {
translate([i*40/2,j*27/2,0]) cylinder(r=m3Rad, h=90, $fn=20, center=true);
}

for(i=[-1,1]){
translate([length/2,i*width/2,thick]) roundedRect([32,10,50], 4);
//translate([length/2-13,i*width/2,0]) roundedRect([7,10,50], 4);
translate([40/2-10,i*27/2,0]) rotate([-i*angle2/2,0,0]) cylinder(r=m3Rad, h=90, $fn=20,center=true);
}

translate([-length/2,0,50/2+thick]) cube(size=[14,50,50], center=true);
translate([-length/2,0,0]) roundedRect([16,15,50], 4);

translate([0,0,15])
rotate([90,angle,0]) {
difference(){
translate([4,0,-30]) hexagon(7,4,60);
translate([-50/2,0,-35])cube(size=[50,20,70]);
}
}//end transversal

hexagon(4,2,10);

}//diff

//antenna holder
difference(){

for(i=[-1,1]){
translate([40/2-10,i*27/2,0]) rotate([-i*angle2/2,0,0]) tube(m3Rad*2, 7.5, 13);
}

translate([0,0,-10/2]) cube(size=[100,100,10], center=true);
for(i=[-1,1]){
translate([40/2-10,i*27/2,10/2+8]) cube(size=[10,25,10], center=true);
}

}//diff
